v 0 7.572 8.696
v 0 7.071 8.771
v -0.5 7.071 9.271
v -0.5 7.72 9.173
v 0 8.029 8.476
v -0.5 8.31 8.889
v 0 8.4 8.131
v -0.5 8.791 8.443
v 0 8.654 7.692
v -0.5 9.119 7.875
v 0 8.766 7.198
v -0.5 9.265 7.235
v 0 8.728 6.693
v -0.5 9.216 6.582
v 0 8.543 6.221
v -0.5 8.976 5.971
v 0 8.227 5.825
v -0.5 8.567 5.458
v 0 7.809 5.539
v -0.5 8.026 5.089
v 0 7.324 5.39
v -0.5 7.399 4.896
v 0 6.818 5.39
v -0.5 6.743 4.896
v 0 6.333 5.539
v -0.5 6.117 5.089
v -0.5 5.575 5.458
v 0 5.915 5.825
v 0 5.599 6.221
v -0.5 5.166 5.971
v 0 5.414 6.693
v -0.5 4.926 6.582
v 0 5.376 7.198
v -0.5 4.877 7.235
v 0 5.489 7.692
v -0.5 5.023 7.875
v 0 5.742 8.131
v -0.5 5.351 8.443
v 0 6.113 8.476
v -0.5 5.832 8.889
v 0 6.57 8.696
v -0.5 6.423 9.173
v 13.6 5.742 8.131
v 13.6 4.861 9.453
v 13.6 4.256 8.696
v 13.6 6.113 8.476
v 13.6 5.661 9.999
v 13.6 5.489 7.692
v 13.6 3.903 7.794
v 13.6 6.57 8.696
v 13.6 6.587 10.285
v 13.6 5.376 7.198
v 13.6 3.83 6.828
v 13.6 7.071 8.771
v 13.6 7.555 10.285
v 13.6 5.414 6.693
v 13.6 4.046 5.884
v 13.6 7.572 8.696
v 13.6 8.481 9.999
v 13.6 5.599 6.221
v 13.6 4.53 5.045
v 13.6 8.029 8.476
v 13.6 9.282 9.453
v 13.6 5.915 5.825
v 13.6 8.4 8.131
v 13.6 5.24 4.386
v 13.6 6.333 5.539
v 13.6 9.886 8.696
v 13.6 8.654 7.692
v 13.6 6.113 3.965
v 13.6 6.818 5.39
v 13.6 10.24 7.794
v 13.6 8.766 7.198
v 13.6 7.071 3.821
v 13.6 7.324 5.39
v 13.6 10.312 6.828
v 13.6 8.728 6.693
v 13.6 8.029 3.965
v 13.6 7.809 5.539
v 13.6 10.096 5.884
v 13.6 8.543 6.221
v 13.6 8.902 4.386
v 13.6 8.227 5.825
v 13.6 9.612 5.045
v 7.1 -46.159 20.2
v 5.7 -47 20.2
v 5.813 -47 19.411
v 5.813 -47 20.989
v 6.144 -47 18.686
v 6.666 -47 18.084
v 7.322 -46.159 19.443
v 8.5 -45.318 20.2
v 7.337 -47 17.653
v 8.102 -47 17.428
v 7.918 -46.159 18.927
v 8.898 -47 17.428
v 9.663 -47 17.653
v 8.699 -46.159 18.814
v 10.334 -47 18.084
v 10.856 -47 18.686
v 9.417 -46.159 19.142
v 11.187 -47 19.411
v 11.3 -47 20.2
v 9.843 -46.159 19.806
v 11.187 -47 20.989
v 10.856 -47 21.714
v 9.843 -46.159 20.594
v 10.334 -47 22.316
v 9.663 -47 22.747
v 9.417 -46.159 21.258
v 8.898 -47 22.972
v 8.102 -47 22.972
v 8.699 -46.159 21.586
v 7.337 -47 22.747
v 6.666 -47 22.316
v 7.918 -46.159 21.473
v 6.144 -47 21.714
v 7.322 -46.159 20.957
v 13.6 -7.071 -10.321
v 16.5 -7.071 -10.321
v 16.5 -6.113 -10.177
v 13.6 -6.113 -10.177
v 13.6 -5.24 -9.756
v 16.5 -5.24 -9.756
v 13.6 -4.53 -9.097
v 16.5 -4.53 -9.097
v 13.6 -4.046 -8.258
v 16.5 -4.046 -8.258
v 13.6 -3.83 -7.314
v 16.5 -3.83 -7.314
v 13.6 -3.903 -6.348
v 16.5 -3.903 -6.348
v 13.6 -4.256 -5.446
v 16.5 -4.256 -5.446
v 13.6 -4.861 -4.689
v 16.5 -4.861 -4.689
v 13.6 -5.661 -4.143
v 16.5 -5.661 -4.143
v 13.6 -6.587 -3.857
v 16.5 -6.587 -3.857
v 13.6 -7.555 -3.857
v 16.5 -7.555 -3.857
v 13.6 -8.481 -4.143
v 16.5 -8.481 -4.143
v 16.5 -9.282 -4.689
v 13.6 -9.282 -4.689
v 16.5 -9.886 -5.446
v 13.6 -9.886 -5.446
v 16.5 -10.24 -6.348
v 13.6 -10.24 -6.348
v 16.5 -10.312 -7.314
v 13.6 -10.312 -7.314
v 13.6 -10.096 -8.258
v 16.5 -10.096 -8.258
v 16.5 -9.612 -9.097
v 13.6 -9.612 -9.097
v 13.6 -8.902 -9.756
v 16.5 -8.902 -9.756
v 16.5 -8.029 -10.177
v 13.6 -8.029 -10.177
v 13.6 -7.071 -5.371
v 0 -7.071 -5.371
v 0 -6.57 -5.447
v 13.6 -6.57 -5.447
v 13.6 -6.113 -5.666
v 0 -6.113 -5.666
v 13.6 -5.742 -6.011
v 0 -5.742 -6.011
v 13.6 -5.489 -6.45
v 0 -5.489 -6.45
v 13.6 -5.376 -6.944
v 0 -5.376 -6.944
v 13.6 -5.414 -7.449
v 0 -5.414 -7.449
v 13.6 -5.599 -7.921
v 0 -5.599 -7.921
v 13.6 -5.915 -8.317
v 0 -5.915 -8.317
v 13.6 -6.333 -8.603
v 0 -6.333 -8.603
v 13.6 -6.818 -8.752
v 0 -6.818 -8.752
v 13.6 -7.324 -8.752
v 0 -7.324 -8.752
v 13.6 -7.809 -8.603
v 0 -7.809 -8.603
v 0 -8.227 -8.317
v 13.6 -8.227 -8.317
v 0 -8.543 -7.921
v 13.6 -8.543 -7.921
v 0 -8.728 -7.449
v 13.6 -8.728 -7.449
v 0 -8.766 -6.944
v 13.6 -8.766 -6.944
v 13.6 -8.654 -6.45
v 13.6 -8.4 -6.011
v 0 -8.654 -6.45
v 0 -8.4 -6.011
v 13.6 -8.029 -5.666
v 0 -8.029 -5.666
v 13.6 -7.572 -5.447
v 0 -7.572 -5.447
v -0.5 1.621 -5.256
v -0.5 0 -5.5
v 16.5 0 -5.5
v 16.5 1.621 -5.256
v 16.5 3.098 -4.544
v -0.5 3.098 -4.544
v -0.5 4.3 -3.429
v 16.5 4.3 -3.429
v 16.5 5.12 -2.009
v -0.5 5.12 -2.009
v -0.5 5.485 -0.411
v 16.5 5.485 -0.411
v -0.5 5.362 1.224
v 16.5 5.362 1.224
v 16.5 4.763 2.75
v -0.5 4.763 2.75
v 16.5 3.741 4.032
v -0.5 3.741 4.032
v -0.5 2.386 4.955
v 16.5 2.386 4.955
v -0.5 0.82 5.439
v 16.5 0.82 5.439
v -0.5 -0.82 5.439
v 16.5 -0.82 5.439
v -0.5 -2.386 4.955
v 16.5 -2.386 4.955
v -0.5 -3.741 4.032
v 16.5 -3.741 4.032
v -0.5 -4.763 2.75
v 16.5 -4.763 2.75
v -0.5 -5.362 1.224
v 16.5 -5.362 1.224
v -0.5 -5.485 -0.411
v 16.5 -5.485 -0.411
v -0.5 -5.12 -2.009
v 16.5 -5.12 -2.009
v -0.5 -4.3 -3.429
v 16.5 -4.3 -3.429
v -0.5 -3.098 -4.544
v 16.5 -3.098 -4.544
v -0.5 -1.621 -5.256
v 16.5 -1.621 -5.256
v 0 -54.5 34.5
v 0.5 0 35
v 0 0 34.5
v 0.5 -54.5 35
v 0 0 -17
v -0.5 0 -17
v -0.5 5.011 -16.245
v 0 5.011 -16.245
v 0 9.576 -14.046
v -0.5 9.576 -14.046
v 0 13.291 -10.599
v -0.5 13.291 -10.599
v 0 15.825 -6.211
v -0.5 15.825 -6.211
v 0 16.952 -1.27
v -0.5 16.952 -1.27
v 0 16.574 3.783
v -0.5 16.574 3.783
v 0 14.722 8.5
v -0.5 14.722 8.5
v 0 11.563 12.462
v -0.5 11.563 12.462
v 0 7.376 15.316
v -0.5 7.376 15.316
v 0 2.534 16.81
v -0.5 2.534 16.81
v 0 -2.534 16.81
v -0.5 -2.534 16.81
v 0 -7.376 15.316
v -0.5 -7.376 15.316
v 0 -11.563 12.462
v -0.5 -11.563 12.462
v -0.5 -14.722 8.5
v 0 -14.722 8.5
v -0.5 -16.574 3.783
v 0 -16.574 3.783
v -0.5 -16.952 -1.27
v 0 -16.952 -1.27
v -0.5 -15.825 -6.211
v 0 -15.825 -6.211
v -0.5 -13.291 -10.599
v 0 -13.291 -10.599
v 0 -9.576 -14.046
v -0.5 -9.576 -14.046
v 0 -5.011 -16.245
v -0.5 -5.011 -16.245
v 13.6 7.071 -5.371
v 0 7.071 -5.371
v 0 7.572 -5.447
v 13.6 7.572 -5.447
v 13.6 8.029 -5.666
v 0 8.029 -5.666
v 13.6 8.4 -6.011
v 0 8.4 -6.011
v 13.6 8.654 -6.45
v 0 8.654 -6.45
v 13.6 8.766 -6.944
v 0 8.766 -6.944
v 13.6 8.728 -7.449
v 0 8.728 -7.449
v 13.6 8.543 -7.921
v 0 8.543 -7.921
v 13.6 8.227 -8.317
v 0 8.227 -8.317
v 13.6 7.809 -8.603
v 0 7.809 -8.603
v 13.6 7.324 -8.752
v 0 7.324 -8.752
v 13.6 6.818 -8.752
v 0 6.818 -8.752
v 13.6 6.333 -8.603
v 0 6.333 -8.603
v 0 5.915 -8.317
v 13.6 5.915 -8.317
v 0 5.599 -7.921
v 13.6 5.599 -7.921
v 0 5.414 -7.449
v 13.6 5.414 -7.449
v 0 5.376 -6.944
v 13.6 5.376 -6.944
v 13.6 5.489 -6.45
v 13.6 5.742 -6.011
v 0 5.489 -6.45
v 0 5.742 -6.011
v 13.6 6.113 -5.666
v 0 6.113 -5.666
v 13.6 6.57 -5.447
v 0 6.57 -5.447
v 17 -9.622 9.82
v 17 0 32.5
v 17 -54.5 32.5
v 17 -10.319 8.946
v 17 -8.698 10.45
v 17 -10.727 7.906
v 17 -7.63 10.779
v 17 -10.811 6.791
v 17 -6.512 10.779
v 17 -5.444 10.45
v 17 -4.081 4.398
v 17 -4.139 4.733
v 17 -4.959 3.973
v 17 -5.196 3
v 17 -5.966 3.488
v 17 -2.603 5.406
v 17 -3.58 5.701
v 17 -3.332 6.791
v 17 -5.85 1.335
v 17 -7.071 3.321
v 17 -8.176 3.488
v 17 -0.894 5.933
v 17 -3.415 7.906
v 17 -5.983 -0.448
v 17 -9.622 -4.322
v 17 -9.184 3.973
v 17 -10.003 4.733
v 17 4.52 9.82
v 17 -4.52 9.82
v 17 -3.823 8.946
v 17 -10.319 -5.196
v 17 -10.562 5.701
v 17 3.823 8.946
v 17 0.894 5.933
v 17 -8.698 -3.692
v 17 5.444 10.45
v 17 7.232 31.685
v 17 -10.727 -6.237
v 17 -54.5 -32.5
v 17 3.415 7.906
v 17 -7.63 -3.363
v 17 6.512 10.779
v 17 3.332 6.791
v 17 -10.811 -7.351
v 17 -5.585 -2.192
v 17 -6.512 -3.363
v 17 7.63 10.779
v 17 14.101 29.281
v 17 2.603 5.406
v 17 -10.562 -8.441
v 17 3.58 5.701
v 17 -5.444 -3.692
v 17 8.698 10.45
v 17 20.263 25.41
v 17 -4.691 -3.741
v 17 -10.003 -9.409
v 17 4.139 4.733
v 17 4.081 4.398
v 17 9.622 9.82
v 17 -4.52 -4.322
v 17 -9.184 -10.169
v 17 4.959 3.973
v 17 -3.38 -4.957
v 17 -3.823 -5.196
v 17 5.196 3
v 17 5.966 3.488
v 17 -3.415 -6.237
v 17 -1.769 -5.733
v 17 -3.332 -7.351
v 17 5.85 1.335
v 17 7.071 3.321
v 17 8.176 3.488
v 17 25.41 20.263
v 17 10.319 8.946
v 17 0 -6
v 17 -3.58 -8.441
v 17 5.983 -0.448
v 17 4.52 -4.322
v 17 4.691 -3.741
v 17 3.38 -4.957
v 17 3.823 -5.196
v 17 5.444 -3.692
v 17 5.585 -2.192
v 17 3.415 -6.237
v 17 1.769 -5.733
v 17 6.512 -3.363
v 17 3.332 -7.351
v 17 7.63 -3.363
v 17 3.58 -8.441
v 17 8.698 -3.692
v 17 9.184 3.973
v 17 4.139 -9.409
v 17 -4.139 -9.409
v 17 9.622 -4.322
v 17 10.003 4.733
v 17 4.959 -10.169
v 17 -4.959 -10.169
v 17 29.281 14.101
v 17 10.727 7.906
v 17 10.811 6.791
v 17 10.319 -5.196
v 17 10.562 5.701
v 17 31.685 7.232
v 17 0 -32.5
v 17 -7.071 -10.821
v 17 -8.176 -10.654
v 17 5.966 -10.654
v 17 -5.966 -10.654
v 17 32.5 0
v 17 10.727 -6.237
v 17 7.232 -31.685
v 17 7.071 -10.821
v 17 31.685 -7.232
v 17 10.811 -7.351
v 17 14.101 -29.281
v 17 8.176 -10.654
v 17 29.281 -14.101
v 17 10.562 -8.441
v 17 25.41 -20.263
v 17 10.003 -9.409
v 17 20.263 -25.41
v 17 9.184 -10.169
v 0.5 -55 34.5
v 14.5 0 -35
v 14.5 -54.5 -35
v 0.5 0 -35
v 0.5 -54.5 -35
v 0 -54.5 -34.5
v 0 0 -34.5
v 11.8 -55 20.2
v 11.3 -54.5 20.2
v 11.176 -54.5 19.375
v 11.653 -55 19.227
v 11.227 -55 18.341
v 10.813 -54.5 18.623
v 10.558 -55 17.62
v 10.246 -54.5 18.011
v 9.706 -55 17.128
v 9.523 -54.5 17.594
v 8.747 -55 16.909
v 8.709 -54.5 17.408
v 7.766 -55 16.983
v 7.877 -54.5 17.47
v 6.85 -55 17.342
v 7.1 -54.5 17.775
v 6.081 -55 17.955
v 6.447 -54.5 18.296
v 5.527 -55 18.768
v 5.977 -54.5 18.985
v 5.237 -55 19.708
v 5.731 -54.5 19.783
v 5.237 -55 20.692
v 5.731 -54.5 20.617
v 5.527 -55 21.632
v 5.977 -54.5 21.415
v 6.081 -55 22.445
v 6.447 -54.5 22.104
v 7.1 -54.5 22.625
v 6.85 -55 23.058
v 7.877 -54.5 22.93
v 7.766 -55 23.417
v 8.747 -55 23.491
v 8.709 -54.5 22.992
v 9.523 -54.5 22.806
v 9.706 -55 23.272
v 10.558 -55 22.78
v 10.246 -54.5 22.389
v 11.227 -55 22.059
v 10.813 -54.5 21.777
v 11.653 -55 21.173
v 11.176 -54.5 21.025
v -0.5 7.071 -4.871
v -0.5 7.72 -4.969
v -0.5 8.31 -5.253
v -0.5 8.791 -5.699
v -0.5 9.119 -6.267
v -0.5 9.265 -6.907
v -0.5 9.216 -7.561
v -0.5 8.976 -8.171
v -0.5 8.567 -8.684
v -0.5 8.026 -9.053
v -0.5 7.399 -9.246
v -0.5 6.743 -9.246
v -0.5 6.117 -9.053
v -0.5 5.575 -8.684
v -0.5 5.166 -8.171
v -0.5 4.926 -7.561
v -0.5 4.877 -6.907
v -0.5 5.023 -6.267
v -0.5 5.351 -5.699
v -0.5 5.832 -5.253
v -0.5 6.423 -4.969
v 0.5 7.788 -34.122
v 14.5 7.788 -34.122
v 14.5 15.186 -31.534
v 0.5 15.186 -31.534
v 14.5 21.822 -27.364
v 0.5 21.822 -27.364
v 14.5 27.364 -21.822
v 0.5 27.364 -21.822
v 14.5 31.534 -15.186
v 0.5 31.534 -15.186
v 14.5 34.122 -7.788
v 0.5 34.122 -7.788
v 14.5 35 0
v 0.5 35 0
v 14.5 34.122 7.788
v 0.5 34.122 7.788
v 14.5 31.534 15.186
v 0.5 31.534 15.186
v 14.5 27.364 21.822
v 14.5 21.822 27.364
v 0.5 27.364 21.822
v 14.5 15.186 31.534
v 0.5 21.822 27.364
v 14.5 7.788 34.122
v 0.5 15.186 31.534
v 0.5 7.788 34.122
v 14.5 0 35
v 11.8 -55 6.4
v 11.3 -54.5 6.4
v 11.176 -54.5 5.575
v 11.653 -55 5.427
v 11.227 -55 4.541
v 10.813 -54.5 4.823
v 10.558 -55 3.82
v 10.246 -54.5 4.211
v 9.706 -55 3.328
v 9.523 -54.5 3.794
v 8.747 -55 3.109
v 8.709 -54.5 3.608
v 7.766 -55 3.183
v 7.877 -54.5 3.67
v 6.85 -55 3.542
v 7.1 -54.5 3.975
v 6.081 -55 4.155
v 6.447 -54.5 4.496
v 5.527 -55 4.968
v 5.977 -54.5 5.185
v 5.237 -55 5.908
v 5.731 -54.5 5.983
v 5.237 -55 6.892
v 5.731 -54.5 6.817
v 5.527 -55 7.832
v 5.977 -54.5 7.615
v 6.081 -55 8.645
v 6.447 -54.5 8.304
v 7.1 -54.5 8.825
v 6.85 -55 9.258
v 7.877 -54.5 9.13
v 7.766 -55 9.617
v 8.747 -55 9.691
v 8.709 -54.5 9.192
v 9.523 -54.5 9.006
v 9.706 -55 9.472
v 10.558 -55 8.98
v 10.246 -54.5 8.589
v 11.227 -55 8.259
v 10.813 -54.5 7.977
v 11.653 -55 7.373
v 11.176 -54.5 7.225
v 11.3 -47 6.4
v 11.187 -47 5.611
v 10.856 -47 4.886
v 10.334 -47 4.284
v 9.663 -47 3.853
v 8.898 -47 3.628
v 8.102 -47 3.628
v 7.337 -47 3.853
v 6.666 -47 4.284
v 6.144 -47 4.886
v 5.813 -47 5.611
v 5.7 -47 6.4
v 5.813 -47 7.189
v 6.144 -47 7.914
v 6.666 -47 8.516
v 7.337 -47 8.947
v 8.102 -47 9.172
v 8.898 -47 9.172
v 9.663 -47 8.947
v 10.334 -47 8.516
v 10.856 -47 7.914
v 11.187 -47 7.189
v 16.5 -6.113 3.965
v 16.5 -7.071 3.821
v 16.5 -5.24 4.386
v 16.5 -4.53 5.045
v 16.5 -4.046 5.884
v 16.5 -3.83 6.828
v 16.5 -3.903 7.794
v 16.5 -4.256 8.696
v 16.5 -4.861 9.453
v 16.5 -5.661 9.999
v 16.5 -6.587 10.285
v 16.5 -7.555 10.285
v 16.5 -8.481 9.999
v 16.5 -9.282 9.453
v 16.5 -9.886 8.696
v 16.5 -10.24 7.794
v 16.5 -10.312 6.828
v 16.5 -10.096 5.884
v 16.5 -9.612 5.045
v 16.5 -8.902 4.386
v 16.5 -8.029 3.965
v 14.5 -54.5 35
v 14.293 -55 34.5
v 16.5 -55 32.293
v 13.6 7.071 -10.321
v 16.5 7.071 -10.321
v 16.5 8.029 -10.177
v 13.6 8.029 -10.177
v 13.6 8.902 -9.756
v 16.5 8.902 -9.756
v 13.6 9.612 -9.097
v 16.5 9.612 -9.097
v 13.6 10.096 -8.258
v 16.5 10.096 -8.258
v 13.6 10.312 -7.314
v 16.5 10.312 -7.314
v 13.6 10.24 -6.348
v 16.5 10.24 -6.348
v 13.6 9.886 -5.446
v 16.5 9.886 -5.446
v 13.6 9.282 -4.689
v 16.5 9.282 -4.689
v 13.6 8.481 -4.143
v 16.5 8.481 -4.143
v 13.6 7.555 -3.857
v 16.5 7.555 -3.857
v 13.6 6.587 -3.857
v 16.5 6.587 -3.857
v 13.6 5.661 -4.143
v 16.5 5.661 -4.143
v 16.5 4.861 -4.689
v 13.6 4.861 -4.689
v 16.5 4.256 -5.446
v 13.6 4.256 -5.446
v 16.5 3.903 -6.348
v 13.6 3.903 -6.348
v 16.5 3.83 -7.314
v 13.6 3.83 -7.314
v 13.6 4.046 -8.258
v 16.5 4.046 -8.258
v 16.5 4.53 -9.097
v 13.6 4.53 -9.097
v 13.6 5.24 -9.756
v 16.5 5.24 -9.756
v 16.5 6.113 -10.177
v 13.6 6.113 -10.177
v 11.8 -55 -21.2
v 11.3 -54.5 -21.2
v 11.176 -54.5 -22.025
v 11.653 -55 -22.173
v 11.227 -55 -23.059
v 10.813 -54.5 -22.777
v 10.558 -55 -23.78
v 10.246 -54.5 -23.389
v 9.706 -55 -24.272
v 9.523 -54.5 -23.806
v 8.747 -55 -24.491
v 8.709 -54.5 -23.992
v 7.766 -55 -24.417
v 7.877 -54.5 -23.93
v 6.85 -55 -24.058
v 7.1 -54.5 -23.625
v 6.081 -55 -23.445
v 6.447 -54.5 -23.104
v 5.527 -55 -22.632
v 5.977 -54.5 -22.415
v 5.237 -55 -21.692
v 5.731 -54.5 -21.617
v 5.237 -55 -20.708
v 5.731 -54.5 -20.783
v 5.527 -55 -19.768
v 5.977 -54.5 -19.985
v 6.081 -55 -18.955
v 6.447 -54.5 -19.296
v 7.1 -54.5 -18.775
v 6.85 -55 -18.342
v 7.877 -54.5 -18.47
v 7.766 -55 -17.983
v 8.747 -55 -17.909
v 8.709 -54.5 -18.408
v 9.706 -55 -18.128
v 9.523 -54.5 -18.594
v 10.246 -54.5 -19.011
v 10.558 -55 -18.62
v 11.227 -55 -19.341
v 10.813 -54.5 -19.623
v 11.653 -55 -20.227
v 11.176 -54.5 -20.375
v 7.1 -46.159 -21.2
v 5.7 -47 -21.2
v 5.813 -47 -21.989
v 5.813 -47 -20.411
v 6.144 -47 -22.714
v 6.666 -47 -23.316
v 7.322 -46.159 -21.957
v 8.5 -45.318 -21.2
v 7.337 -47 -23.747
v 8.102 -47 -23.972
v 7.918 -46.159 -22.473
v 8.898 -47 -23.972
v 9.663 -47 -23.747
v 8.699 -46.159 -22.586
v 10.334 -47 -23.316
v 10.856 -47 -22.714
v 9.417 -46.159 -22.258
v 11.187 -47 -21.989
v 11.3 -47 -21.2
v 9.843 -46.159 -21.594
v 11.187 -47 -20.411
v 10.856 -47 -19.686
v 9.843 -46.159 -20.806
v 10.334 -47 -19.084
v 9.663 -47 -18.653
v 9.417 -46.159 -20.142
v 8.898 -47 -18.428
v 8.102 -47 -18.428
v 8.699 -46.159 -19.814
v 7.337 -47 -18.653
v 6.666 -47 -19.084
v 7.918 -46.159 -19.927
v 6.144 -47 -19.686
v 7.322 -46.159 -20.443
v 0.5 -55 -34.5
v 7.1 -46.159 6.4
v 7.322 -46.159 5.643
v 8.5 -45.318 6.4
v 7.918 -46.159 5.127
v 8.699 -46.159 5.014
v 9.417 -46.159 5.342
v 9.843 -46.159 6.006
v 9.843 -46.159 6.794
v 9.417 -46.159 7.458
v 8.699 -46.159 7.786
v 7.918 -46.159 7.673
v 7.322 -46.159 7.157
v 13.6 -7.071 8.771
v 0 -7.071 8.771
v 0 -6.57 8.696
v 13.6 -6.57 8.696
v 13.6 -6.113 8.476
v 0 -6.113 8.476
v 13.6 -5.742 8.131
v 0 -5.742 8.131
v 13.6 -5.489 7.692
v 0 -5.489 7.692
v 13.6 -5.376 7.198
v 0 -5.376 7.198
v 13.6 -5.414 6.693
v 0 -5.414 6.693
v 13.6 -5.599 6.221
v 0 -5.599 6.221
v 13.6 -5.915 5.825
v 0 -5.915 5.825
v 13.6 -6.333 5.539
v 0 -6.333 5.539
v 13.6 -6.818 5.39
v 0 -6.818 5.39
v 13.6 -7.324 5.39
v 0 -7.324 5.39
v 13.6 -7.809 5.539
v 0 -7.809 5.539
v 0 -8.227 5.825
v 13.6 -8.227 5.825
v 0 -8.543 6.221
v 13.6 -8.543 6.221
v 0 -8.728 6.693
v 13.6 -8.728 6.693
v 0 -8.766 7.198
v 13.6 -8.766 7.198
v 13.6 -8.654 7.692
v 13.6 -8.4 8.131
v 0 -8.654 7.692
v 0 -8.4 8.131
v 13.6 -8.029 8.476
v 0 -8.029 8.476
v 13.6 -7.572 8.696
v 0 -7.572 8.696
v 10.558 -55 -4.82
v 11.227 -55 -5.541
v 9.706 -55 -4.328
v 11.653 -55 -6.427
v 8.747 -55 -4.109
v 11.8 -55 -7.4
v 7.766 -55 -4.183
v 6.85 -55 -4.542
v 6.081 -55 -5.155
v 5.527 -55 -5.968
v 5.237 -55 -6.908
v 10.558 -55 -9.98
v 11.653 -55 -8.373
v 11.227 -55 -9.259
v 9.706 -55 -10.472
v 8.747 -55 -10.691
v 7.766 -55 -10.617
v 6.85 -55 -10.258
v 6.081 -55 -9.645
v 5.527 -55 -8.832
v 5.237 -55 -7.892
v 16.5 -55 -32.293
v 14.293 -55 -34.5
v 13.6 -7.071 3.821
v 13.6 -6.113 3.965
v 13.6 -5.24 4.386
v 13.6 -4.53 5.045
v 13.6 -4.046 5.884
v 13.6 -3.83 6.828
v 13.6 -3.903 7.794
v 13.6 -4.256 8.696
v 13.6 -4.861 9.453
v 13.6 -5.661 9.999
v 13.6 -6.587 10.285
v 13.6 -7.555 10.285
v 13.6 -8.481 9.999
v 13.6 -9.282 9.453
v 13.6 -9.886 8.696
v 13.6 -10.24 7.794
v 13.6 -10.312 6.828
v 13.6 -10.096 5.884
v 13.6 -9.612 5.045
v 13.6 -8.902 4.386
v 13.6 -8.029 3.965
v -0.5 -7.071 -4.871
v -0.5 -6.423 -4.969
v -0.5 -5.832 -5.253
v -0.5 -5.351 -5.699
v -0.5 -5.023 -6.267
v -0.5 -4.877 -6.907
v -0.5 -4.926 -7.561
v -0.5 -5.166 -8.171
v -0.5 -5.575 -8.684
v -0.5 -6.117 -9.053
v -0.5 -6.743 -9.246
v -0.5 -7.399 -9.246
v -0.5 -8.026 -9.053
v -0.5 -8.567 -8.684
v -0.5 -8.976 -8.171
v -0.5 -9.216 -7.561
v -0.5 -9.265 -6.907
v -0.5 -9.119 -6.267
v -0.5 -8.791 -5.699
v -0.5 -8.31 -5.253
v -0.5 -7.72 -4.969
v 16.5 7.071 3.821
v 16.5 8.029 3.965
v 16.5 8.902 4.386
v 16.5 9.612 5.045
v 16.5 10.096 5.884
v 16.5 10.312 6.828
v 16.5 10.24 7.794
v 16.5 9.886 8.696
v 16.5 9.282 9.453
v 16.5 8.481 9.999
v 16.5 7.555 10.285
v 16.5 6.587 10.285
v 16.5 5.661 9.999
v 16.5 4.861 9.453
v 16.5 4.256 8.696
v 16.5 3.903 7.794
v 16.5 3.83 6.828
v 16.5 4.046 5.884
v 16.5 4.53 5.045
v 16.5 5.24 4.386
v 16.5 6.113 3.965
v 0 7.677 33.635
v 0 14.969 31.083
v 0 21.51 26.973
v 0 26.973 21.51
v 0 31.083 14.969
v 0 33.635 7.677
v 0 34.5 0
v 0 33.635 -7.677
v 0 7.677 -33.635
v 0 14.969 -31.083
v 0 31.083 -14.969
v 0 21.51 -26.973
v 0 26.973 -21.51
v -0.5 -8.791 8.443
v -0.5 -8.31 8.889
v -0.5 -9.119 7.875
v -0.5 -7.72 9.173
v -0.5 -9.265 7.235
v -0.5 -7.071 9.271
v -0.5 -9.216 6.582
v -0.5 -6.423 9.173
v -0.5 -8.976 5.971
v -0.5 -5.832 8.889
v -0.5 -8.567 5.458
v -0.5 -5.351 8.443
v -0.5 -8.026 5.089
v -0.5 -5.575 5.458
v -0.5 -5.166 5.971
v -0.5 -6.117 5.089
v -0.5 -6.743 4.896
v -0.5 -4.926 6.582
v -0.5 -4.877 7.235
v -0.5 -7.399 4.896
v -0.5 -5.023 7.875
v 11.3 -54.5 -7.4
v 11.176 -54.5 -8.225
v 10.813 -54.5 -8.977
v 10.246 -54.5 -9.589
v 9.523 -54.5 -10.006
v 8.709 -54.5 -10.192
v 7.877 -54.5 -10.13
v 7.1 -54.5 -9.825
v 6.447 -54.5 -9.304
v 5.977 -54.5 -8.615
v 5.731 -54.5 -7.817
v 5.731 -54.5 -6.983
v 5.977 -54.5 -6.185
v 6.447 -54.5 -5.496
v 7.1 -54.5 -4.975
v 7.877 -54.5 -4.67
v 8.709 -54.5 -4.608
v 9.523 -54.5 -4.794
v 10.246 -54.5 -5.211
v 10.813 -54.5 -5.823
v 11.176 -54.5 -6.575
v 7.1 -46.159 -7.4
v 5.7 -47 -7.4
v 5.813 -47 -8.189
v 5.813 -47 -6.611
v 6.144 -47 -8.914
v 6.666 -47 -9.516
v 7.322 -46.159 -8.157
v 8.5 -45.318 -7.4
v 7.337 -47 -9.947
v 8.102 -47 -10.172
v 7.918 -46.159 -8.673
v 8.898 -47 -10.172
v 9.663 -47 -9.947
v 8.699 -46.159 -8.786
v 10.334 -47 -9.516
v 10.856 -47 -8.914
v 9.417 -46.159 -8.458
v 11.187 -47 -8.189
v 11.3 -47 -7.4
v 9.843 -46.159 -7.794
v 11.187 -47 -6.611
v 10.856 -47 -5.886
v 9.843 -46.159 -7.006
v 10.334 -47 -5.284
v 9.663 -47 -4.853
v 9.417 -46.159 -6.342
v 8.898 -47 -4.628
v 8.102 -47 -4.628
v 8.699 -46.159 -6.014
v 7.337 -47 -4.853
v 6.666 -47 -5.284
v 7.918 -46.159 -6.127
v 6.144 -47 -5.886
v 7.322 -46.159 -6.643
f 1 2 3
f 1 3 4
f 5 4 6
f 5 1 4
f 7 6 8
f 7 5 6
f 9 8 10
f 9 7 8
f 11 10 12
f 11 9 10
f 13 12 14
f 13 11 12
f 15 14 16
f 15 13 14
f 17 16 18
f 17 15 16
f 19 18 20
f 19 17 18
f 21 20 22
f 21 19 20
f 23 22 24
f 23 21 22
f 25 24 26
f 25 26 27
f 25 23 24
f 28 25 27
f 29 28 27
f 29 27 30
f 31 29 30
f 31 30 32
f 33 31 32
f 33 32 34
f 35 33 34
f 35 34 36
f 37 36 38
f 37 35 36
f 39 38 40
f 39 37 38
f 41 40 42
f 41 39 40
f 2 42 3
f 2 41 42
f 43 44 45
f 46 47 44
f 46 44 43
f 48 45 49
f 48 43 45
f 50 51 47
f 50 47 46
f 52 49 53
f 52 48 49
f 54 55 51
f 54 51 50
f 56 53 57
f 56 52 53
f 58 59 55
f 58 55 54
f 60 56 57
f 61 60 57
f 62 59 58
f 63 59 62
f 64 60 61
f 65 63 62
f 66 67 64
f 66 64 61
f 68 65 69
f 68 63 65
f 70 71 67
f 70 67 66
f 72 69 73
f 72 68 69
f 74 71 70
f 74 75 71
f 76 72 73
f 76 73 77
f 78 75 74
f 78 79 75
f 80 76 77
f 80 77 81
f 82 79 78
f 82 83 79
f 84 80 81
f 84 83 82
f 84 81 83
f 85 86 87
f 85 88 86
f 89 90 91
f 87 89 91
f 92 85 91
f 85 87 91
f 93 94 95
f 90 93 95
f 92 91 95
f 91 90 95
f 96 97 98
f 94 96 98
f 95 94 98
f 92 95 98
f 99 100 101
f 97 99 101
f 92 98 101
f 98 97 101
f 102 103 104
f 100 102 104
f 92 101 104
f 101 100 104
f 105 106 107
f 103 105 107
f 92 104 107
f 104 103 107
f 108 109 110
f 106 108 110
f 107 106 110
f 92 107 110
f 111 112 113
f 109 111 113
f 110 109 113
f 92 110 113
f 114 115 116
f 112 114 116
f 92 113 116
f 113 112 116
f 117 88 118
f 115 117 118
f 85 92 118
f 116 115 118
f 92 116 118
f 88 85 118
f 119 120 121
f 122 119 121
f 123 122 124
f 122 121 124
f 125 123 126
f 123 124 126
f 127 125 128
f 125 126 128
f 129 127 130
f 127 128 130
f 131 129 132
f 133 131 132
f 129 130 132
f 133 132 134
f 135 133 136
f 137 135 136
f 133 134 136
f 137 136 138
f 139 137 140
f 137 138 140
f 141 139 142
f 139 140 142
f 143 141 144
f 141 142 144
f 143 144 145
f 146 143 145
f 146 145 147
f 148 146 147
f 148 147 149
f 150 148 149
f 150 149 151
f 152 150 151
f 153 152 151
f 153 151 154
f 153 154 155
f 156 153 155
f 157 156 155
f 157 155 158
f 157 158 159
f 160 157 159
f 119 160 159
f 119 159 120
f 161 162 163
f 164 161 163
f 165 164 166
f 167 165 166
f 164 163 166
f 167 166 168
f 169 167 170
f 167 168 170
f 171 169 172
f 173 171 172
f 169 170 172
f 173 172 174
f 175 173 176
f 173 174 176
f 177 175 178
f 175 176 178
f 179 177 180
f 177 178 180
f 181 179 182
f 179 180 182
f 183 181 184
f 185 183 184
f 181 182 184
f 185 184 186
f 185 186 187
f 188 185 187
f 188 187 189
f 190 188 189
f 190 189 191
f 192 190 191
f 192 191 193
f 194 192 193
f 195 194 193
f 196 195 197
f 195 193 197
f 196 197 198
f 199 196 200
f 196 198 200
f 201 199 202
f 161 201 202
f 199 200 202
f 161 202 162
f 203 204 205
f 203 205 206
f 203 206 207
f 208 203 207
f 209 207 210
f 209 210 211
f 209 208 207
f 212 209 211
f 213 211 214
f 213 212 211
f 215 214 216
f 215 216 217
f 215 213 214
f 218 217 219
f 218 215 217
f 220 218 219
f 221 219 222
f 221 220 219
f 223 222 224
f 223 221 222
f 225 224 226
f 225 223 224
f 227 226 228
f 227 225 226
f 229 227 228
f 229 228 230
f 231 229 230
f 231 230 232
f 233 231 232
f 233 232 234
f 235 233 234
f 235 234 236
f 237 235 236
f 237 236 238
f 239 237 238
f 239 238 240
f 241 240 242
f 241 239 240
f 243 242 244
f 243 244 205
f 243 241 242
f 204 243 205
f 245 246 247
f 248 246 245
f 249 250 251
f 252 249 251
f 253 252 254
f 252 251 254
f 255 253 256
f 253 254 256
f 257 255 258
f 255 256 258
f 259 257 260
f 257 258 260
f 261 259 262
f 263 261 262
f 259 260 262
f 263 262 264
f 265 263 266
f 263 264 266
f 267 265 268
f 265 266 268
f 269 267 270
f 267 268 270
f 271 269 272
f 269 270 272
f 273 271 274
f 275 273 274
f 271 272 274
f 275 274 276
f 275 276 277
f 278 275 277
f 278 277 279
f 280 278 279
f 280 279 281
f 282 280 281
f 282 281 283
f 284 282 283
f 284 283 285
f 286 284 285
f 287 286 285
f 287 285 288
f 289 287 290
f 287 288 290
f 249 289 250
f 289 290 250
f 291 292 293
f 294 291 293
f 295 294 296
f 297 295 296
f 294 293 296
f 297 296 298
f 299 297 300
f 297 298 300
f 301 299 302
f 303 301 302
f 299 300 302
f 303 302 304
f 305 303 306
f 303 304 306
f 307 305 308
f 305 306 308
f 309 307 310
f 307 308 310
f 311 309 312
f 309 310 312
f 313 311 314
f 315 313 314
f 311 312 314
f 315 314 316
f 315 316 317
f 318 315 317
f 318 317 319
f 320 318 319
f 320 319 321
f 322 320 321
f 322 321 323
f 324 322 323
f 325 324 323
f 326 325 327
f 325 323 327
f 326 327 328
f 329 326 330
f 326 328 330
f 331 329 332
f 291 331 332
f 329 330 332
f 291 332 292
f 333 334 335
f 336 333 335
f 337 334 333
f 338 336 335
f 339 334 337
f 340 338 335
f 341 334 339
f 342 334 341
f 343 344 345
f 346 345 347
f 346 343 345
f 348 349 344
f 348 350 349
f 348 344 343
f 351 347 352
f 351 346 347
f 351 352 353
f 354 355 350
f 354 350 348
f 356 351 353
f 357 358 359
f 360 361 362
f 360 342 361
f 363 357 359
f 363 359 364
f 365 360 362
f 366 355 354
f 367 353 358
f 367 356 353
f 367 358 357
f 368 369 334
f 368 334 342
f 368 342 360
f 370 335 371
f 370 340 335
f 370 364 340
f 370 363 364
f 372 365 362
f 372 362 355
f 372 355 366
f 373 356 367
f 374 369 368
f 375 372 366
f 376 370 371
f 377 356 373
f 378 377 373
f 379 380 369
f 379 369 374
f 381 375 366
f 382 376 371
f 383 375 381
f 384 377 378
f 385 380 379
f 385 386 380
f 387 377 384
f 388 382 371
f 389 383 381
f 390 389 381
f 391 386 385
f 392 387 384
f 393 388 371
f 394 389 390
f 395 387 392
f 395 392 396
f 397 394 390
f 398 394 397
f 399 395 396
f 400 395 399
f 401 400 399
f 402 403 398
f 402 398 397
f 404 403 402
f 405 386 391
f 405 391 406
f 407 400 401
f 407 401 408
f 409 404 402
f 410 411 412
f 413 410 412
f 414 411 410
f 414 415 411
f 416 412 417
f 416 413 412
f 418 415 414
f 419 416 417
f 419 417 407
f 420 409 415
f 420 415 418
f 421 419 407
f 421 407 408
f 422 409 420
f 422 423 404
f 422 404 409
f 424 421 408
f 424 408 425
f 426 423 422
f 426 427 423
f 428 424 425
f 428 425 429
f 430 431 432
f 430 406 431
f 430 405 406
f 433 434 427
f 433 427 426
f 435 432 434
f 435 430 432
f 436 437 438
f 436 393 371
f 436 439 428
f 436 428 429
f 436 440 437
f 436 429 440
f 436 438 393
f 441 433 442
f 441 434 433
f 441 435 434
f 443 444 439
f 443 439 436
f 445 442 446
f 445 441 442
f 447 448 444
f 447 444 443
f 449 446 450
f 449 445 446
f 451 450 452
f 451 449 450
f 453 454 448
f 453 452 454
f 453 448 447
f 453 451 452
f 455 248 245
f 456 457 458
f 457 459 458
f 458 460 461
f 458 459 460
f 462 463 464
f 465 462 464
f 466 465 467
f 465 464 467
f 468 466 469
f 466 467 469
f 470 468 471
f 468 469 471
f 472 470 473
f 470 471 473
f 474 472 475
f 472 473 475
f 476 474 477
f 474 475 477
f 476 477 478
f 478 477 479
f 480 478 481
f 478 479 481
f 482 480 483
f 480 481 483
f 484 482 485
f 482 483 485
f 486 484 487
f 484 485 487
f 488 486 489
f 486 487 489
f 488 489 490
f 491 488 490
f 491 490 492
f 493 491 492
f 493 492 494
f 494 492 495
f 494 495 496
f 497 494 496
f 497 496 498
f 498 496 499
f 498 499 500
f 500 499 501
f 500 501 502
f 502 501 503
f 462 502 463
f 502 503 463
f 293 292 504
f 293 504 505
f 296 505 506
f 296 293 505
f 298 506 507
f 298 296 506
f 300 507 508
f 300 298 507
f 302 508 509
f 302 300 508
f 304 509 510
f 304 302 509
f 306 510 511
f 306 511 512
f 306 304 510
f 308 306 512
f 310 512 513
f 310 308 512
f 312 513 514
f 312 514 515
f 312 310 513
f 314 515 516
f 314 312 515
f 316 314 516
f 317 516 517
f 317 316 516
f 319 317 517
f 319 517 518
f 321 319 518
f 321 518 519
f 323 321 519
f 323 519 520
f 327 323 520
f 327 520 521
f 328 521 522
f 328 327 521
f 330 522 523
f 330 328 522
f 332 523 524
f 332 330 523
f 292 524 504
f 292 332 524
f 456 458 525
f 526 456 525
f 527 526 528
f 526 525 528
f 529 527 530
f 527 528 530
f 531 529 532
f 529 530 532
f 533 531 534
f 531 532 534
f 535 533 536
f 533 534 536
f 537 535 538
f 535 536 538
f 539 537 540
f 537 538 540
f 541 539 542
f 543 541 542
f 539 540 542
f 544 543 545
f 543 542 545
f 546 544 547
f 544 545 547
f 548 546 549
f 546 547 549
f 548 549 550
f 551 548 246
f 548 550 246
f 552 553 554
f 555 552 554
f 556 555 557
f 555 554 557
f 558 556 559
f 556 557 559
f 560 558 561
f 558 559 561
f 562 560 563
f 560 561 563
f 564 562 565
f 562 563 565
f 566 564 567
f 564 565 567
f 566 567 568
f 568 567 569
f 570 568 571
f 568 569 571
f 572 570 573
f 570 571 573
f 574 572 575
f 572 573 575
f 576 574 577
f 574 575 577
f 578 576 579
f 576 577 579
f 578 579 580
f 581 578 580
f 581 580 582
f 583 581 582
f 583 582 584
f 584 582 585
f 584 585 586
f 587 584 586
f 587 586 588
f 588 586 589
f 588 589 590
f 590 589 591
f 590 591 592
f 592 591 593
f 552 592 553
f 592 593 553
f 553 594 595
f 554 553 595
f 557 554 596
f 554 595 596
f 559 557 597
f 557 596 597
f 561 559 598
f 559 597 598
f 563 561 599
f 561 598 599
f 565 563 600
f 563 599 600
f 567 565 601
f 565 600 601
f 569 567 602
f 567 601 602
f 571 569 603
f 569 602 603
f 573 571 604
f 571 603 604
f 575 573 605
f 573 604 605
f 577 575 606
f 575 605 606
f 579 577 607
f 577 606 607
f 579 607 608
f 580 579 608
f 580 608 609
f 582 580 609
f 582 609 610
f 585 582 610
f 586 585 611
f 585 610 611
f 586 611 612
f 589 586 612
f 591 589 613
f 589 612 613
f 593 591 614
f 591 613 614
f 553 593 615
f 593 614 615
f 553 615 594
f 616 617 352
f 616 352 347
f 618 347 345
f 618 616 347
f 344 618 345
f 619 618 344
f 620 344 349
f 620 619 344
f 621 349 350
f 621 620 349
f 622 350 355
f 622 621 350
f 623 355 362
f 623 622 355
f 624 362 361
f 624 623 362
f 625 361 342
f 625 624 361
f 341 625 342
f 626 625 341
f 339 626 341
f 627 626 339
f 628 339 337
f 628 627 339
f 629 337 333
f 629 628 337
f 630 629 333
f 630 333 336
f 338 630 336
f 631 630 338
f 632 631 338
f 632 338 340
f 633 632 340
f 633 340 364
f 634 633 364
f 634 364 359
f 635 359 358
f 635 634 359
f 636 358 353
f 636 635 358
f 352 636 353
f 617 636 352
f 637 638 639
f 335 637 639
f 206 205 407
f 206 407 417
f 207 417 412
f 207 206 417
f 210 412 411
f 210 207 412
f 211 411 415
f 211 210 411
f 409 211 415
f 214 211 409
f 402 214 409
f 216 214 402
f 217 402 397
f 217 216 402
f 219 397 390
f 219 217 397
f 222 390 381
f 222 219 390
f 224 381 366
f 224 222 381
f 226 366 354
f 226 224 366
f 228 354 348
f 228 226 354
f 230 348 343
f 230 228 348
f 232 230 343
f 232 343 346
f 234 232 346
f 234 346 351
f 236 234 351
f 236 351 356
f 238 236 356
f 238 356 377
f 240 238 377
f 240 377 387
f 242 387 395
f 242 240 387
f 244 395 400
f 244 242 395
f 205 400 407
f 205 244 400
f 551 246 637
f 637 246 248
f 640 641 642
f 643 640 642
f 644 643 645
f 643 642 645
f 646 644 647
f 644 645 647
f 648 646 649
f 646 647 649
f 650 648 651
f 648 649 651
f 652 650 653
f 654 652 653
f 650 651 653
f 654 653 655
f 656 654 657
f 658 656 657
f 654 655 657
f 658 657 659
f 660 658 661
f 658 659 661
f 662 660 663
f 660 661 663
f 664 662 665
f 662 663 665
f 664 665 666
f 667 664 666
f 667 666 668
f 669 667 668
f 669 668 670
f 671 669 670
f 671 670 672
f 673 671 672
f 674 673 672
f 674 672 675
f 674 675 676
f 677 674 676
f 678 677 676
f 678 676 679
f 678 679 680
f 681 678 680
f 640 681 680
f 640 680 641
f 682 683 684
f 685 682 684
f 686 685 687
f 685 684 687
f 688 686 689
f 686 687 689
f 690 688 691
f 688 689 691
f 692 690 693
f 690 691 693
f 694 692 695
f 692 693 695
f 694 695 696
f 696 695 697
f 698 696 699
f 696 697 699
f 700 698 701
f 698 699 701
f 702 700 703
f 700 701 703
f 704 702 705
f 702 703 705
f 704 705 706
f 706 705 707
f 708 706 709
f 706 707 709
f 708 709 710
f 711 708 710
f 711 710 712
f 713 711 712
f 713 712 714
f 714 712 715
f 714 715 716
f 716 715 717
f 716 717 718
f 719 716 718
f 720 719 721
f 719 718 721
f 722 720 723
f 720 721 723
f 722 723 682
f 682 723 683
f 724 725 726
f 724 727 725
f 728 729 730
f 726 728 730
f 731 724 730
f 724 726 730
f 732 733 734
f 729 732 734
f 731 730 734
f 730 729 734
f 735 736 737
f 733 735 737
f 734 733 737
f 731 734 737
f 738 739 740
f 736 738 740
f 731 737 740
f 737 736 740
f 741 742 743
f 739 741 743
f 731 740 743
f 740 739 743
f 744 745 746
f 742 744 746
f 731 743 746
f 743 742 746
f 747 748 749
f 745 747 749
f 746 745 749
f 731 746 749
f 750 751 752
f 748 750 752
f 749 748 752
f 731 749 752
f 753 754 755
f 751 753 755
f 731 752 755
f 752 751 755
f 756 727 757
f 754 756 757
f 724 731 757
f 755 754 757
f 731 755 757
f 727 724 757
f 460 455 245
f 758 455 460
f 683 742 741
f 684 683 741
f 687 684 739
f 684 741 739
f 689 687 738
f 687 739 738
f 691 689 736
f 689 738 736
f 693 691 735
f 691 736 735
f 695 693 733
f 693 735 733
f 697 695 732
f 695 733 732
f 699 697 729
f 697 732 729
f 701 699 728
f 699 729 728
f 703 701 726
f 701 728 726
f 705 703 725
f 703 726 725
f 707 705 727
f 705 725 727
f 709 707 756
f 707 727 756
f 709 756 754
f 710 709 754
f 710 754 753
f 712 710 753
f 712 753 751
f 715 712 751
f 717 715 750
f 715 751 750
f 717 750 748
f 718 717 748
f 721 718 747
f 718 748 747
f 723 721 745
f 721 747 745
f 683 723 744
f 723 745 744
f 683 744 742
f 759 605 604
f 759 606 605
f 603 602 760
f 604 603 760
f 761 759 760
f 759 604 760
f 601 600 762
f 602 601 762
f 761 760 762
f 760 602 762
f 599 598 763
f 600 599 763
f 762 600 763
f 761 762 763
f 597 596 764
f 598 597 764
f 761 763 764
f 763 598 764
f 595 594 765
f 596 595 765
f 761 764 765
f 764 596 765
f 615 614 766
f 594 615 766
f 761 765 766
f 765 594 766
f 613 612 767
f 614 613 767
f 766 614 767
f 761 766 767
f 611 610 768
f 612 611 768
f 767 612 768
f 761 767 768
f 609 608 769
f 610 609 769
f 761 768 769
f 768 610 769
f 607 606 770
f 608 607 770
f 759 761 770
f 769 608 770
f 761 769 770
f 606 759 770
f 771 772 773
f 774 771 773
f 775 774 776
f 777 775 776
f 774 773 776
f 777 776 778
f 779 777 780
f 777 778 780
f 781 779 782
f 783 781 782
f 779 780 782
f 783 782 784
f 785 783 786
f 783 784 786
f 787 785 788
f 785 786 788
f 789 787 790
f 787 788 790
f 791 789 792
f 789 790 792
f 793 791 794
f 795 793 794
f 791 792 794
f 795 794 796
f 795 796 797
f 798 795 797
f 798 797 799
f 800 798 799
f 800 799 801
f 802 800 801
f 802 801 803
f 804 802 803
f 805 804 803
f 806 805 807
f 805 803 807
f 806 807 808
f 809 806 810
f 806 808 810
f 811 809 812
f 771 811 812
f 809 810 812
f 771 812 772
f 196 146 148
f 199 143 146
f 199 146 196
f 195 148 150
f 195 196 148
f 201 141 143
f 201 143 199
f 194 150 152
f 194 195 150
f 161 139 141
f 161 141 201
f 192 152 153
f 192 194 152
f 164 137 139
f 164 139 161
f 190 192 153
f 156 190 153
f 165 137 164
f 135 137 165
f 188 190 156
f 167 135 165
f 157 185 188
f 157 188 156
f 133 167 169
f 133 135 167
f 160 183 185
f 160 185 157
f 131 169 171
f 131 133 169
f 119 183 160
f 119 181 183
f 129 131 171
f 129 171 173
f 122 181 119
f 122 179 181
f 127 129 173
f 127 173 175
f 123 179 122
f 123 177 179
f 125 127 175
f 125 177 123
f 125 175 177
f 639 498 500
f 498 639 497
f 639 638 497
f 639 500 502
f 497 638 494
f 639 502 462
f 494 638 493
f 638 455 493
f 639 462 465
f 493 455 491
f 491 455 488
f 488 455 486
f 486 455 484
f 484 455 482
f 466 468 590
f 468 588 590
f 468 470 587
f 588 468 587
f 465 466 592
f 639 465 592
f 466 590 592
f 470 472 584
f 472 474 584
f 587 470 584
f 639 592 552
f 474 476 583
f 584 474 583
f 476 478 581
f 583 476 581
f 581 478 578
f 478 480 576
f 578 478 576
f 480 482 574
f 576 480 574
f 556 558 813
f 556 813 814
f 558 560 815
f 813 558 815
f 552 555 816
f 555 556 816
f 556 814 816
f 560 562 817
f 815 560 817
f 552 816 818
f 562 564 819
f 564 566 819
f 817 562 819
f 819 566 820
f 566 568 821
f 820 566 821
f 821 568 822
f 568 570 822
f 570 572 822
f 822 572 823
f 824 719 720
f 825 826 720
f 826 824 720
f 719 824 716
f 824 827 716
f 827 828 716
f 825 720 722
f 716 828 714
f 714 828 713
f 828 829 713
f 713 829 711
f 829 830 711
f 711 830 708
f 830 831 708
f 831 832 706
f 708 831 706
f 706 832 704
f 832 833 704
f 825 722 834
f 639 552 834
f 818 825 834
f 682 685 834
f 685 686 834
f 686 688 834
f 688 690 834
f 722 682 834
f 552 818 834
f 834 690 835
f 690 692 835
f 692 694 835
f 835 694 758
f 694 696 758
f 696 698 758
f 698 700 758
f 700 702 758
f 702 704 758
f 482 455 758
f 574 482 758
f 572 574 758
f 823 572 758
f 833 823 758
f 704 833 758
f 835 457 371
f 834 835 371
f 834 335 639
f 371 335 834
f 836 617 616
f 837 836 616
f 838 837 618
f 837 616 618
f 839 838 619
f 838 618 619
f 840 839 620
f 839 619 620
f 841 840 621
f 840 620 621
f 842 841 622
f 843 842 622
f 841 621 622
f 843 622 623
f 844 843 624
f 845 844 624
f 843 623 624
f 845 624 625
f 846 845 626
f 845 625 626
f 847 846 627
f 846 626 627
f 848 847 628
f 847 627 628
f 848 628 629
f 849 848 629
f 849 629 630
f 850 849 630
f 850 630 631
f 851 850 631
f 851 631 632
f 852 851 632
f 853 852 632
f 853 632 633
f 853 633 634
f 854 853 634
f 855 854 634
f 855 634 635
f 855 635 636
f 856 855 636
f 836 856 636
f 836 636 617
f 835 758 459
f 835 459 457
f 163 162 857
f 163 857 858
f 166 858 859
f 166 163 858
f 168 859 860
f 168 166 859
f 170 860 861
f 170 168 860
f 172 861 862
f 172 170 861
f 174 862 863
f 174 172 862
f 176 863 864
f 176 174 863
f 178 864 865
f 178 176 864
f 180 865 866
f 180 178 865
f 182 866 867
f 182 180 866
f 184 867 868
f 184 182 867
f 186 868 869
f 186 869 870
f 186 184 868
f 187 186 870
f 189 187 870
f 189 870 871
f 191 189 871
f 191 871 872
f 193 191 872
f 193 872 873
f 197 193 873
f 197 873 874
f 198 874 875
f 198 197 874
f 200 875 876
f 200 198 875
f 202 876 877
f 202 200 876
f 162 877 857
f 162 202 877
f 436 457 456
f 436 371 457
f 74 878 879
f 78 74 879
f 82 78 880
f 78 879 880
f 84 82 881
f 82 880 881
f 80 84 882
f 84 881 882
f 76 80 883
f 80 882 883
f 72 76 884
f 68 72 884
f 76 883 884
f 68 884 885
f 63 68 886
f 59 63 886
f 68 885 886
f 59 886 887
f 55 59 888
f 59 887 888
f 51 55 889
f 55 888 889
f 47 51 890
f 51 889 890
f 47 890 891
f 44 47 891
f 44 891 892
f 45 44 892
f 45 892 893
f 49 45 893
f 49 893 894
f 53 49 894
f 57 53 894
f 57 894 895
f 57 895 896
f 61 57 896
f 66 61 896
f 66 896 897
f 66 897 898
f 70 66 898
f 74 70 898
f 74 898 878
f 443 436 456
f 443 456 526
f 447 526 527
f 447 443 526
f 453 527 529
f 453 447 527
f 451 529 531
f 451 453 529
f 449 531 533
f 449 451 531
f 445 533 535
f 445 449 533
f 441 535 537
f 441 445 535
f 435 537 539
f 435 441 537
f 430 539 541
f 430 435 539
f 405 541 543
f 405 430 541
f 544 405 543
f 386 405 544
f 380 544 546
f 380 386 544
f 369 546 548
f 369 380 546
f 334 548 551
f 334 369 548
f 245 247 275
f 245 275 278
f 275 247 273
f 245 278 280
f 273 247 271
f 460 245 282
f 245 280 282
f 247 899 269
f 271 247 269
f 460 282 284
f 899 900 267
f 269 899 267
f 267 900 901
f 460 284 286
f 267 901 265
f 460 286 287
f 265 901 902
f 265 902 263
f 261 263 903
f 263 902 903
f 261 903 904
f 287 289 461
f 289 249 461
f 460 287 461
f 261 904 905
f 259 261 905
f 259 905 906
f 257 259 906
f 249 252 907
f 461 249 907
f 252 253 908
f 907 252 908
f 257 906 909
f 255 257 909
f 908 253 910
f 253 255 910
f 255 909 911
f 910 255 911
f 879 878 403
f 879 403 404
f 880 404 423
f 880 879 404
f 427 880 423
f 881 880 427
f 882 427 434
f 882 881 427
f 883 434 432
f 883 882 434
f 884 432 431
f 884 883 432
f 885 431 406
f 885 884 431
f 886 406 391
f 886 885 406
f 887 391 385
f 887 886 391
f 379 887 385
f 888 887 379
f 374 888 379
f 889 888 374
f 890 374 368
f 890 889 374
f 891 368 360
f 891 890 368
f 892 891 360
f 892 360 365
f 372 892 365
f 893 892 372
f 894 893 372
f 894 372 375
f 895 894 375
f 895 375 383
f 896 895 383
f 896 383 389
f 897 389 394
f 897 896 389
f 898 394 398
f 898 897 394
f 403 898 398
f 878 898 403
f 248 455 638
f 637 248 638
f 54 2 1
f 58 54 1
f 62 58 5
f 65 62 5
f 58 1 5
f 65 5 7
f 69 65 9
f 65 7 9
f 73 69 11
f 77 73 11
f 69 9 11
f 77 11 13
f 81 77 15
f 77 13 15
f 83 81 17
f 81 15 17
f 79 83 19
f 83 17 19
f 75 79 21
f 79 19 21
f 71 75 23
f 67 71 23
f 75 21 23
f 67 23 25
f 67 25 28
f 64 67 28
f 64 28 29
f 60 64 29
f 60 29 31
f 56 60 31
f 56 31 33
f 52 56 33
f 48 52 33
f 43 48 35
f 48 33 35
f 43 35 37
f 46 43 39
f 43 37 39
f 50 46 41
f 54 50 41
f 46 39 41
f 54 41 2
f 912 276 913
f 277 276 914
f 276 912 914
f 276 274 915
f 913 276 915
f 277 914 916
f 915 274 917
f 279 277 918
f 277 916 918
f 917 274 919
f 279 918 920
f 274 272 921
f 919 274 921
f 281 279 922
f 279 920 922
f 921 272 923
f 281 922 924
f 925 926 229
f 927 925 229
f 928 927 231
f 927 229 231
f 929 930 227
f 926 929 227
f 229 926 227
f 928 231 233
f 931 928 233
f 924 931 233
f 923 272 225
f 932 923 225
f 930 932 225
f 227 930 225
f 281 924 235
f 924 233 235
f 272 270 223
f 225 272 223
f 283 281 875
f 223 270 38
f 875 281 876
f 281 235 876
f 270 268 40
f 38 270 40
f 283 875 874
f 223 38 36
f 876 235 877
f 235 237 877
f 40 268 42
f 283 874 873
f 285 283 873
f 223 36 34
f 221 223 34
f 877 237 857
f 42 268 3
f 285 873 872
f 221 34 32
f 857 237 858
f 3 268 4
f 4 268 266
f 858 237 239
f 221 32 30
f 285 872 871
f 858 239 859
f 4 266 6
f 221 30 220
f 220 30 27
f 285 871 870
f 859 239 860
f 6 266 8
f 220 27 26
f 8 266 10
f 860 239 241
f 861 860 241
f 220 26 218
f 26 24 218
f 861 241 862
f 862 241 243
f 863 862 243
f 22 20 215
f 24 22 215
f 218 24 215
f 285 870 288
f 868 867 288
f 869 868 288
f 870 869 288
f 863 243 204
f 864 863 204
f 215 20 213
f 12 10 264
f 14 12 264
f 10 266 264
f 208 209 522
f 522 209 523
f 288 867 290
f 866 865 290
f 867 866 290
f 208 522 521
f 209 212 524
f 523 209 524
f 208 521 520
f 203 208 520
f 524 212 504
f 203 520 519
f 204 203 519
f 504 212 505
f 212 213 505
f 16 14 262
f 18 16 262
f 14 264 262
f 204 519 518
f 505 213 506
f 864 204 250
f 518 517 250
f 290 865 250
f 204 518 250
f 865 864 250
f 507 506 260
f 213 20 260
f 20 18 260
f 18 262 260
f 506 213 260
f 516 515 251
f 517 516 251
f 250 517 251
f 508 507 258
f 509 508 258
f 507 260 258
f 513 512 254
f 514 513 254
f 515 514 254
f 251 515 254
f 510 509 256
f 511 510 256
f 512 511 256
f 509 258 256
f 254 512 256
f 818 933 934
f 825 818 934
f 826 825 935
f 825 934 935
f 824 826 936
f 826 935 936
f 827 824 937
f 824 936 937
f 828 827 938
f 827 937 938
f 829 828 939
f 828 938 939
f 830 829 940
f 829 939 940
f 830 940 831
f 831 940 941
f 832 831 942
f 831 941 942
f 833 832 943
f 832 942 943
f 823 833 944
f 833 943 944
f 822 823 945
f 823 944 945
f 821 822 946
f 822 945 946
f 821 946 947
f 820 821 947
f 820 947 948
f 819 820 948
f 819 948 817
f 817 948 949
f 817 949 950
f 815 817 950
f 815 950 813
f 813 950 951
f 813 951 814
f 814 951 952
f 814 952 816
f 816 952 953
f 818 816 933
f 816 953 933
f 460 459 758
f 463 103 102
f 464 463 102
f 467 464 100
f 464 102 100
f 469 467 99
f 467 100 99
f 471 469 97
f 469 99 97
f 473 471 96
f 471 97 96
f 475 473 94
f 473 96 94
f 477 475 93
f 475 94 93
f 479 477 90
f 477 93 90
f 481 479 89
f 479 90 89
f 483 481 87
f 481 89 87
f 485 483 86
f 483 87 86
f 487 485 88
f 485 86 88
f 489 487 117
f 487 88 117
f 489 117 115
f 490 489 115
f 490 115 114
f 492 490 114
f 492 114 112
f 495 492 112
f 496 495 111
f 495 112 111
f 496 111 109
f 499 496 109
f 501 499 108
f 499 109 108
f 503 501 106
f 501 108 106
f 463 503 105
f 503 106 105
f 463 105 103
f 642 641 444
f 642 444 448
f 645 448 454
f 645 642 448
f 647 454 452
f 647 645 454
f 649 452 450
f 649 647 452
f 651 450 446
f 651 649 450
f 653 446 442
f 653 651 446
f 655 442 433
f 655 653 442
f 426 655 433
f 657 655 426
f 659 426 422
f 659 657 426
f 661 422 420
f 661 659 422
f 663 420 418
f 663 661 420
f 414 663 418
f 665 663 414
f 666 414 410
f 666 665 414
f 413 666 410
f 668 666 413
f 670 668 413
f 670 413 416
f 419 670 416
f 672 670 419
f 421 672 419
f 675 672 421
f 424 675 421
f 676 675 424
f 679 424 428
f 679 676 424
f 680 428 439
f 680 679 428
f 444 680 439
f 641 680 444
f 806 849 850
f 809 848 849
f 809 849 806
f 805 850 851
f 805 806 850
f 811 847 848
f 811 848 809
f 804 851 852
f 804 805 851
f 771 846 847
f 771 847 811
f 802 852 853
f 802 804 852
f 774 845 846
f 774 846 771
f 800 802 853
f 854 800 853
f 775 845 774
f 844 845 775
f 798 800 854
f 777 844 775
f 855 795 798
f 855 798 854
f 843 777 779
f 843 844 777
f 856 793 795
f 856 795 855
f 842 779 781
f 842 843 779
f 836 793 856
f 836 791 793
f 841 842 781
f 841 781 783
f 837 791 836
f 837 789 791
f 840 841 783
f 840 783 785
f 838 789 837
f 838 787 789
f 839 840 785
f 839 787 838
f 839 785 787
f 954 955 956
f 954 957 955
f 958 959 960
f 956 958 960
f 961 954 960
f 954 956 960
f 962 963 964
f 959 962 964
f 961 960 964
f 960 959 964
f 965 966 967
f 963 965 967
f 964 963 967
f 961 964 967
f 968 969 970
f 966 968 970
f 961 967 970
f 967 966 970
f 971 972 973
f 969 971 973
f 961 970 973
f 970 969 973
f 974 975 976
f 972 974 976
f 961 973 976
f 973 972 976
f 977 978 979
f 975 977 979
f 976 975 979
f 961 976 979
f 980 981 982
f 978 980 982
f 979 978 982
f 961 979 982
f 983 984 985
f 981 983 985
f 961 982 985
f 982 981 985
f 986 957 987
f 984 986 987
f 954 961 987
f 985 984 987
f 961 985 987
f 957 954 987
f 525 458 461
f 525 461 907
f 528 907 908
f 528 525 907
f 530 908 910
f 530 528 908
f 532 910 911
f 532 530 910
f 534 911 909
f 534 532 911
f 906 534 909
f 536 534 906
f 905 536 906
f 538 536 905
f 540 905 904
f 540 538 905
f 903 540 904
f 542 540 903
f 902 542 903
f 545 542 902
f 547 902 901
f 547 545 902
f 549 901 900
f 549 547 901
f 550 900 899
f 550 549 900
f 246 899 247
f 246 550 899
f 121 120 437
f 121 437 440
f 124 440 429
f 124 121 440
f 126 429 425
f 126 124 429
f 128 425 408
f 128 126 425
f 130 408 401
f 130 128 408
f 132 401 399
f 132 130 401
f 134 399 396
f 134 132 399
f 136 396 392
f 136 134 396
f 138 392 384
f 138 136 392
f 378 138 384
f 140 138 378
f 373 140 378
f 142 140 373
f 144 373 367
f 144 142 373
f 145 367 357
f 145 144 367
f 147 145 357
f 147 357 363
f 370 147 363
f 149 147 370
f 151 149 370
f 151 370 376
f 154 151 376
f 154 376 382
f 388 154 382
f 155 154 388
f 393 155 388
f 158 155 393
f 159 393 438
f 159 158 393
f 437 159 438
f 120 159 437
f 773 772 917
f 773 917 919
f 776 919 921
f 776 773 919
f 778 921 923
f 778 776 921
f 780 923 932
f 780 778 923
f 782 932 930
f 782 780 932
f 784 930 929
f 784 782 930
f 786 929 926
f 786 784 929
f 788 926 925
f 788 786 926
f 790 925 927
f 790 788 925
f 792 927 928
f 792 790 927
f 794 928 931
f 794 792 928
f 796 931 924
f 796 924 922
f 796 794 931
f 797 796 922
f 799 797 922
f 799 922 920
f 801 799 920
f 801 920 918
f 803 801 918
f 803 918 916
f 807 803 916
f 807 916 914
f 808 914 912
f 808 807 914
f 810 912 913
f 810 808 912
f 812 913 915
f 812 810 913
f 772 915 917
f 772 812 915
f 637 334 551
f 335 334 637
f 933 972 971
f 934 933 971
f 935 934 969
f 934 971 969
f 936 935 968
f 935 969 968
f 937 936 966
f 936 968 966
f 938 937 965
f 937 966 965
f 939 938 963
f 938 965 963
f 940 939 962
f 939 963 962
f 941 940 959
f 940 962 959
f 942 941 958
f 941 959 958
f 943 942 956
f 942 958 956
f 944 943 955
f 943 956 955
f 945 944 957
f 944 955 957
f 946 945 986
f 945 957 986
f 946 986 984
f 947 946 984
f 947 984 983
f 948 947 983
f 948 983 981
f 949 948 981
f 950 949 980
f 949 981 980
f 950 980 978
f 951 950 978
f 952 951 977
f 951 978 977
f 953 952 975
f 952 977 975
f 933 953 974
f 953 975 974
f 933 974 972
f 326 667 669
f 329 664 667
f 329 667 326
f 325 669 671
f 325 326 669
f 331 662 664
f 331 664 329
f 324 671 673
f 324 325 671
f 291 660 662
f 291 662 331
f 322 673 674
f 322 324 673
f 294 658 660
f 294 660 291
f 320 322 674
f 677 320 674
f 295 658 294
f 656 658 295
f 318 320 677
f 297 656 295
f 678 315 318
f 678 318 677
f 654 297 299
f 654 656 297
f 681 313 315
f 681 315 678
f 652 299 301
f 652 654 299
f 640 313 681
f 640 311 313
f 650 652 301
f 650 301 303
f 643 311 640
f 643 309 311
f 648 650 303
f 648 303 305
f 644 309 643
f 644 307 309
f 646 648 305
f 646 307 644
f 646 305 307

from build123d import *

# Parameters (mm, degrees)
SKETCH1_R                                           = 35
SKETCH1_R_2                                         = 5.5
SKETCH1_R_3                                         = 17
BOSS_EXTRUDE1_DEPTH                                 = 17
BOSS_EXTRUDE2_START                                 = -0.5
SKETCH1_3_R                                         = 17
SKETCH1_3_R_2                                       = 5.5
BOSS_EXTRUDE2_DEPTH                                 = 0.5
CBORE_FOR_M3_HEX_SOCKET_HEAD_CAP_SCREW1_D           = 3.4
CBORE_FOR_M3_HEX_SOCKET_HEAD_CAP_SCREW1_CBORE_D     = 6.5
CBORE_FOR_M3_HEX_SOCKET_HEAD_CAP_SCREW1_CBORE_DEPTH = 3.4
F_5_6_5_6_DIAMETER_HOLE1_D                          = 5.6
F_5_6_5_6_DIAMETER_HOLE1_DEPTH                      = 8
F_5_6_5_6_DIAMETER_HOLE1_TIP                        = 1.682409733
F_2_5MM_CHAMFER1_SIZE                               = 2.5
F_0_5MM_CHAMFER2_SIZE                               = 0.5


with BuildPart() as part:
    # Sketch1 → Boss-Extrude1 (new body)
    # profile 1 of 3: a face of its own
    with BuildSketch(Plane(origin=(0, 0, 0), x_dir=(0, 0, -1), z_dir=(1, 0, 0))):
        Circle(SKETCH1_R)
        Circle(SKETCH1_R_2, mode=Mode.SUBTRACT)
    # profile 2 of 3: a face of its own
    with BuildSketch(Plane(origin=(0, 0, 0), x_dir=(0, 0, -1), z_dir=(1, 0, 0))):
        with BuildLine():
            ThreePointArc((35, 0), (0, -35), (-35, 0))
            Line((-35, 0), (-35, -55))
            Line((-35, -55), (35, -55))
            Line((35, -55), (35, 0))
        make_face()
    # profile 3 of 3: a face of its own
    with BuildSketch(Plane(origin=(0, 0, 0), x_dir=(0, 0, -1), z_dir=(1, 0, 0))):
        Circle(SKETCH1_R_3)
        Circle(SKETCH1_R_2, mode=Mode.SUBTRACT)
    extrude(amount=BOSS_EXTRUDE1_DEPTH)

    # Sketch1<3> → Boss-Extrude2 (add)
    with BuildSketch(Plane(origin=(0, 0, 0), x_dir=(0, 0, -1), z_dir=(1, 0, 0)).offset(BOSS_EXTRUDE2_START)):
        Circle(SKETCH1_3_R)
        Circle(SKETCH1_3_R_2, mode=Mode.SUBTRACT)
    extrude(amount=BOSS_EXTRUDE2_DEPTH)

    # CBORE for M3 Hex Socket Head Cap Screw1 (through all)
    with Locations(Plane(origin=(17, 0, 0), x_dir=(0, 0, -1), z_dir=(1, 0, 0))):
        with Locations((-7.071067812, 7.071067812), (7.071067812, 7.071067812), (7.071067812, -7.071067812), (-7.071067812, -7.071067812)):
            CounterBoreHole(CBORE_FOR_M3_HEX_SOCKET_HEAD_CAP_SCREW1_D / 2, CBORE_FOR_M3_HEX_SOCKET_HEAD_CAP_SCREW1_CBORE_D / 2, CBORE_FOR_M3_HEX_SOCKET_HEAD_CAP_SCREW1_CBORE_DEPTH)

    # Ø5.6 (5.6) Diameter Hole1
    with Locations(Plane(origin=(0, -55, 0), x_dir=(-1, 0, 0), z_dir=(0, -1, 0))):
        with Locations((-8.5, -20.2), (-8.5, 21.2), (-8.5, 7.4), (-8.5, -6.4)):
            Hole(F_5_6_5_6_DIAMETER_HOLE1_D / 2, depth=F_5_6_5_6_DIAMETER_HOLE1_DEPTH)
            with Locations((0, 0, -(F_5_6_5_6_DIAMETER_HOLE1_DEPTH + F_5_6_5_6_DIAMETER_HOLE1_TIP / 2))):  # 118° drill point
                Cone(0, F_5_6_5_6_DIAMETER_HOLE1_D / 2, F_5_6_5_6_DIAMETER_HOLE1_TIP, mode=Mode.SUBTRACT)

    # 2,5mm Chamfer1
    f_2_5mm_chamfer1_edges = [part.edges().sort_by_distance(p)[0] for p in [
        (17, -27.5, 35),
        (17, -27.5, -35),
        (17, 35, 0),
    ]]
    chamfer(f_2_5mm_chamfer1_edges, length=F_2_5MM_CHAMFER1_SIZE)

    # 0,5mm Chamfer2
    f_0_5mm_chamfer2_edges = [part.edges().sort_by_distance(p)[0] for p in [
        (17, 0, 5.5),
        (17, 7.071067812, 10.321067812),
        (-0.5, 7.071067812, 5.371067812),
        (17, -7.071067812, 10.321067812),
        (-0.5, -7.071067812, 5.371067812),
        (17, -7.071067812, -3.821067812),
        (-0.5, -7.071067812, -8.771067812),
        (17, 7.071067812, -3.821067812),
        (-0.5, 7.071067812, -8.771067812),
        (5.7, -55, 20.2),
        (5.7, -55, 6.4),
        (5.7, -55, -7.4),
        (5.7, -55, -21.2),
        (0, -27.5, -35),
        (7.25, -55, -35),
        (17, -55, 0),
        (7.25, -55, 35),
        (0, -55, 0),
        (15.75, -55, 33.75),
        (15.75, -55, -33.75),
        (0, -27.5, 35),
        (0, 35, 0),
    ]]
    chamfer(f_0_5mm_chamfer2_edges, length=F_0_5MM_CHAMFER2_SIZE)


solid = part.part
